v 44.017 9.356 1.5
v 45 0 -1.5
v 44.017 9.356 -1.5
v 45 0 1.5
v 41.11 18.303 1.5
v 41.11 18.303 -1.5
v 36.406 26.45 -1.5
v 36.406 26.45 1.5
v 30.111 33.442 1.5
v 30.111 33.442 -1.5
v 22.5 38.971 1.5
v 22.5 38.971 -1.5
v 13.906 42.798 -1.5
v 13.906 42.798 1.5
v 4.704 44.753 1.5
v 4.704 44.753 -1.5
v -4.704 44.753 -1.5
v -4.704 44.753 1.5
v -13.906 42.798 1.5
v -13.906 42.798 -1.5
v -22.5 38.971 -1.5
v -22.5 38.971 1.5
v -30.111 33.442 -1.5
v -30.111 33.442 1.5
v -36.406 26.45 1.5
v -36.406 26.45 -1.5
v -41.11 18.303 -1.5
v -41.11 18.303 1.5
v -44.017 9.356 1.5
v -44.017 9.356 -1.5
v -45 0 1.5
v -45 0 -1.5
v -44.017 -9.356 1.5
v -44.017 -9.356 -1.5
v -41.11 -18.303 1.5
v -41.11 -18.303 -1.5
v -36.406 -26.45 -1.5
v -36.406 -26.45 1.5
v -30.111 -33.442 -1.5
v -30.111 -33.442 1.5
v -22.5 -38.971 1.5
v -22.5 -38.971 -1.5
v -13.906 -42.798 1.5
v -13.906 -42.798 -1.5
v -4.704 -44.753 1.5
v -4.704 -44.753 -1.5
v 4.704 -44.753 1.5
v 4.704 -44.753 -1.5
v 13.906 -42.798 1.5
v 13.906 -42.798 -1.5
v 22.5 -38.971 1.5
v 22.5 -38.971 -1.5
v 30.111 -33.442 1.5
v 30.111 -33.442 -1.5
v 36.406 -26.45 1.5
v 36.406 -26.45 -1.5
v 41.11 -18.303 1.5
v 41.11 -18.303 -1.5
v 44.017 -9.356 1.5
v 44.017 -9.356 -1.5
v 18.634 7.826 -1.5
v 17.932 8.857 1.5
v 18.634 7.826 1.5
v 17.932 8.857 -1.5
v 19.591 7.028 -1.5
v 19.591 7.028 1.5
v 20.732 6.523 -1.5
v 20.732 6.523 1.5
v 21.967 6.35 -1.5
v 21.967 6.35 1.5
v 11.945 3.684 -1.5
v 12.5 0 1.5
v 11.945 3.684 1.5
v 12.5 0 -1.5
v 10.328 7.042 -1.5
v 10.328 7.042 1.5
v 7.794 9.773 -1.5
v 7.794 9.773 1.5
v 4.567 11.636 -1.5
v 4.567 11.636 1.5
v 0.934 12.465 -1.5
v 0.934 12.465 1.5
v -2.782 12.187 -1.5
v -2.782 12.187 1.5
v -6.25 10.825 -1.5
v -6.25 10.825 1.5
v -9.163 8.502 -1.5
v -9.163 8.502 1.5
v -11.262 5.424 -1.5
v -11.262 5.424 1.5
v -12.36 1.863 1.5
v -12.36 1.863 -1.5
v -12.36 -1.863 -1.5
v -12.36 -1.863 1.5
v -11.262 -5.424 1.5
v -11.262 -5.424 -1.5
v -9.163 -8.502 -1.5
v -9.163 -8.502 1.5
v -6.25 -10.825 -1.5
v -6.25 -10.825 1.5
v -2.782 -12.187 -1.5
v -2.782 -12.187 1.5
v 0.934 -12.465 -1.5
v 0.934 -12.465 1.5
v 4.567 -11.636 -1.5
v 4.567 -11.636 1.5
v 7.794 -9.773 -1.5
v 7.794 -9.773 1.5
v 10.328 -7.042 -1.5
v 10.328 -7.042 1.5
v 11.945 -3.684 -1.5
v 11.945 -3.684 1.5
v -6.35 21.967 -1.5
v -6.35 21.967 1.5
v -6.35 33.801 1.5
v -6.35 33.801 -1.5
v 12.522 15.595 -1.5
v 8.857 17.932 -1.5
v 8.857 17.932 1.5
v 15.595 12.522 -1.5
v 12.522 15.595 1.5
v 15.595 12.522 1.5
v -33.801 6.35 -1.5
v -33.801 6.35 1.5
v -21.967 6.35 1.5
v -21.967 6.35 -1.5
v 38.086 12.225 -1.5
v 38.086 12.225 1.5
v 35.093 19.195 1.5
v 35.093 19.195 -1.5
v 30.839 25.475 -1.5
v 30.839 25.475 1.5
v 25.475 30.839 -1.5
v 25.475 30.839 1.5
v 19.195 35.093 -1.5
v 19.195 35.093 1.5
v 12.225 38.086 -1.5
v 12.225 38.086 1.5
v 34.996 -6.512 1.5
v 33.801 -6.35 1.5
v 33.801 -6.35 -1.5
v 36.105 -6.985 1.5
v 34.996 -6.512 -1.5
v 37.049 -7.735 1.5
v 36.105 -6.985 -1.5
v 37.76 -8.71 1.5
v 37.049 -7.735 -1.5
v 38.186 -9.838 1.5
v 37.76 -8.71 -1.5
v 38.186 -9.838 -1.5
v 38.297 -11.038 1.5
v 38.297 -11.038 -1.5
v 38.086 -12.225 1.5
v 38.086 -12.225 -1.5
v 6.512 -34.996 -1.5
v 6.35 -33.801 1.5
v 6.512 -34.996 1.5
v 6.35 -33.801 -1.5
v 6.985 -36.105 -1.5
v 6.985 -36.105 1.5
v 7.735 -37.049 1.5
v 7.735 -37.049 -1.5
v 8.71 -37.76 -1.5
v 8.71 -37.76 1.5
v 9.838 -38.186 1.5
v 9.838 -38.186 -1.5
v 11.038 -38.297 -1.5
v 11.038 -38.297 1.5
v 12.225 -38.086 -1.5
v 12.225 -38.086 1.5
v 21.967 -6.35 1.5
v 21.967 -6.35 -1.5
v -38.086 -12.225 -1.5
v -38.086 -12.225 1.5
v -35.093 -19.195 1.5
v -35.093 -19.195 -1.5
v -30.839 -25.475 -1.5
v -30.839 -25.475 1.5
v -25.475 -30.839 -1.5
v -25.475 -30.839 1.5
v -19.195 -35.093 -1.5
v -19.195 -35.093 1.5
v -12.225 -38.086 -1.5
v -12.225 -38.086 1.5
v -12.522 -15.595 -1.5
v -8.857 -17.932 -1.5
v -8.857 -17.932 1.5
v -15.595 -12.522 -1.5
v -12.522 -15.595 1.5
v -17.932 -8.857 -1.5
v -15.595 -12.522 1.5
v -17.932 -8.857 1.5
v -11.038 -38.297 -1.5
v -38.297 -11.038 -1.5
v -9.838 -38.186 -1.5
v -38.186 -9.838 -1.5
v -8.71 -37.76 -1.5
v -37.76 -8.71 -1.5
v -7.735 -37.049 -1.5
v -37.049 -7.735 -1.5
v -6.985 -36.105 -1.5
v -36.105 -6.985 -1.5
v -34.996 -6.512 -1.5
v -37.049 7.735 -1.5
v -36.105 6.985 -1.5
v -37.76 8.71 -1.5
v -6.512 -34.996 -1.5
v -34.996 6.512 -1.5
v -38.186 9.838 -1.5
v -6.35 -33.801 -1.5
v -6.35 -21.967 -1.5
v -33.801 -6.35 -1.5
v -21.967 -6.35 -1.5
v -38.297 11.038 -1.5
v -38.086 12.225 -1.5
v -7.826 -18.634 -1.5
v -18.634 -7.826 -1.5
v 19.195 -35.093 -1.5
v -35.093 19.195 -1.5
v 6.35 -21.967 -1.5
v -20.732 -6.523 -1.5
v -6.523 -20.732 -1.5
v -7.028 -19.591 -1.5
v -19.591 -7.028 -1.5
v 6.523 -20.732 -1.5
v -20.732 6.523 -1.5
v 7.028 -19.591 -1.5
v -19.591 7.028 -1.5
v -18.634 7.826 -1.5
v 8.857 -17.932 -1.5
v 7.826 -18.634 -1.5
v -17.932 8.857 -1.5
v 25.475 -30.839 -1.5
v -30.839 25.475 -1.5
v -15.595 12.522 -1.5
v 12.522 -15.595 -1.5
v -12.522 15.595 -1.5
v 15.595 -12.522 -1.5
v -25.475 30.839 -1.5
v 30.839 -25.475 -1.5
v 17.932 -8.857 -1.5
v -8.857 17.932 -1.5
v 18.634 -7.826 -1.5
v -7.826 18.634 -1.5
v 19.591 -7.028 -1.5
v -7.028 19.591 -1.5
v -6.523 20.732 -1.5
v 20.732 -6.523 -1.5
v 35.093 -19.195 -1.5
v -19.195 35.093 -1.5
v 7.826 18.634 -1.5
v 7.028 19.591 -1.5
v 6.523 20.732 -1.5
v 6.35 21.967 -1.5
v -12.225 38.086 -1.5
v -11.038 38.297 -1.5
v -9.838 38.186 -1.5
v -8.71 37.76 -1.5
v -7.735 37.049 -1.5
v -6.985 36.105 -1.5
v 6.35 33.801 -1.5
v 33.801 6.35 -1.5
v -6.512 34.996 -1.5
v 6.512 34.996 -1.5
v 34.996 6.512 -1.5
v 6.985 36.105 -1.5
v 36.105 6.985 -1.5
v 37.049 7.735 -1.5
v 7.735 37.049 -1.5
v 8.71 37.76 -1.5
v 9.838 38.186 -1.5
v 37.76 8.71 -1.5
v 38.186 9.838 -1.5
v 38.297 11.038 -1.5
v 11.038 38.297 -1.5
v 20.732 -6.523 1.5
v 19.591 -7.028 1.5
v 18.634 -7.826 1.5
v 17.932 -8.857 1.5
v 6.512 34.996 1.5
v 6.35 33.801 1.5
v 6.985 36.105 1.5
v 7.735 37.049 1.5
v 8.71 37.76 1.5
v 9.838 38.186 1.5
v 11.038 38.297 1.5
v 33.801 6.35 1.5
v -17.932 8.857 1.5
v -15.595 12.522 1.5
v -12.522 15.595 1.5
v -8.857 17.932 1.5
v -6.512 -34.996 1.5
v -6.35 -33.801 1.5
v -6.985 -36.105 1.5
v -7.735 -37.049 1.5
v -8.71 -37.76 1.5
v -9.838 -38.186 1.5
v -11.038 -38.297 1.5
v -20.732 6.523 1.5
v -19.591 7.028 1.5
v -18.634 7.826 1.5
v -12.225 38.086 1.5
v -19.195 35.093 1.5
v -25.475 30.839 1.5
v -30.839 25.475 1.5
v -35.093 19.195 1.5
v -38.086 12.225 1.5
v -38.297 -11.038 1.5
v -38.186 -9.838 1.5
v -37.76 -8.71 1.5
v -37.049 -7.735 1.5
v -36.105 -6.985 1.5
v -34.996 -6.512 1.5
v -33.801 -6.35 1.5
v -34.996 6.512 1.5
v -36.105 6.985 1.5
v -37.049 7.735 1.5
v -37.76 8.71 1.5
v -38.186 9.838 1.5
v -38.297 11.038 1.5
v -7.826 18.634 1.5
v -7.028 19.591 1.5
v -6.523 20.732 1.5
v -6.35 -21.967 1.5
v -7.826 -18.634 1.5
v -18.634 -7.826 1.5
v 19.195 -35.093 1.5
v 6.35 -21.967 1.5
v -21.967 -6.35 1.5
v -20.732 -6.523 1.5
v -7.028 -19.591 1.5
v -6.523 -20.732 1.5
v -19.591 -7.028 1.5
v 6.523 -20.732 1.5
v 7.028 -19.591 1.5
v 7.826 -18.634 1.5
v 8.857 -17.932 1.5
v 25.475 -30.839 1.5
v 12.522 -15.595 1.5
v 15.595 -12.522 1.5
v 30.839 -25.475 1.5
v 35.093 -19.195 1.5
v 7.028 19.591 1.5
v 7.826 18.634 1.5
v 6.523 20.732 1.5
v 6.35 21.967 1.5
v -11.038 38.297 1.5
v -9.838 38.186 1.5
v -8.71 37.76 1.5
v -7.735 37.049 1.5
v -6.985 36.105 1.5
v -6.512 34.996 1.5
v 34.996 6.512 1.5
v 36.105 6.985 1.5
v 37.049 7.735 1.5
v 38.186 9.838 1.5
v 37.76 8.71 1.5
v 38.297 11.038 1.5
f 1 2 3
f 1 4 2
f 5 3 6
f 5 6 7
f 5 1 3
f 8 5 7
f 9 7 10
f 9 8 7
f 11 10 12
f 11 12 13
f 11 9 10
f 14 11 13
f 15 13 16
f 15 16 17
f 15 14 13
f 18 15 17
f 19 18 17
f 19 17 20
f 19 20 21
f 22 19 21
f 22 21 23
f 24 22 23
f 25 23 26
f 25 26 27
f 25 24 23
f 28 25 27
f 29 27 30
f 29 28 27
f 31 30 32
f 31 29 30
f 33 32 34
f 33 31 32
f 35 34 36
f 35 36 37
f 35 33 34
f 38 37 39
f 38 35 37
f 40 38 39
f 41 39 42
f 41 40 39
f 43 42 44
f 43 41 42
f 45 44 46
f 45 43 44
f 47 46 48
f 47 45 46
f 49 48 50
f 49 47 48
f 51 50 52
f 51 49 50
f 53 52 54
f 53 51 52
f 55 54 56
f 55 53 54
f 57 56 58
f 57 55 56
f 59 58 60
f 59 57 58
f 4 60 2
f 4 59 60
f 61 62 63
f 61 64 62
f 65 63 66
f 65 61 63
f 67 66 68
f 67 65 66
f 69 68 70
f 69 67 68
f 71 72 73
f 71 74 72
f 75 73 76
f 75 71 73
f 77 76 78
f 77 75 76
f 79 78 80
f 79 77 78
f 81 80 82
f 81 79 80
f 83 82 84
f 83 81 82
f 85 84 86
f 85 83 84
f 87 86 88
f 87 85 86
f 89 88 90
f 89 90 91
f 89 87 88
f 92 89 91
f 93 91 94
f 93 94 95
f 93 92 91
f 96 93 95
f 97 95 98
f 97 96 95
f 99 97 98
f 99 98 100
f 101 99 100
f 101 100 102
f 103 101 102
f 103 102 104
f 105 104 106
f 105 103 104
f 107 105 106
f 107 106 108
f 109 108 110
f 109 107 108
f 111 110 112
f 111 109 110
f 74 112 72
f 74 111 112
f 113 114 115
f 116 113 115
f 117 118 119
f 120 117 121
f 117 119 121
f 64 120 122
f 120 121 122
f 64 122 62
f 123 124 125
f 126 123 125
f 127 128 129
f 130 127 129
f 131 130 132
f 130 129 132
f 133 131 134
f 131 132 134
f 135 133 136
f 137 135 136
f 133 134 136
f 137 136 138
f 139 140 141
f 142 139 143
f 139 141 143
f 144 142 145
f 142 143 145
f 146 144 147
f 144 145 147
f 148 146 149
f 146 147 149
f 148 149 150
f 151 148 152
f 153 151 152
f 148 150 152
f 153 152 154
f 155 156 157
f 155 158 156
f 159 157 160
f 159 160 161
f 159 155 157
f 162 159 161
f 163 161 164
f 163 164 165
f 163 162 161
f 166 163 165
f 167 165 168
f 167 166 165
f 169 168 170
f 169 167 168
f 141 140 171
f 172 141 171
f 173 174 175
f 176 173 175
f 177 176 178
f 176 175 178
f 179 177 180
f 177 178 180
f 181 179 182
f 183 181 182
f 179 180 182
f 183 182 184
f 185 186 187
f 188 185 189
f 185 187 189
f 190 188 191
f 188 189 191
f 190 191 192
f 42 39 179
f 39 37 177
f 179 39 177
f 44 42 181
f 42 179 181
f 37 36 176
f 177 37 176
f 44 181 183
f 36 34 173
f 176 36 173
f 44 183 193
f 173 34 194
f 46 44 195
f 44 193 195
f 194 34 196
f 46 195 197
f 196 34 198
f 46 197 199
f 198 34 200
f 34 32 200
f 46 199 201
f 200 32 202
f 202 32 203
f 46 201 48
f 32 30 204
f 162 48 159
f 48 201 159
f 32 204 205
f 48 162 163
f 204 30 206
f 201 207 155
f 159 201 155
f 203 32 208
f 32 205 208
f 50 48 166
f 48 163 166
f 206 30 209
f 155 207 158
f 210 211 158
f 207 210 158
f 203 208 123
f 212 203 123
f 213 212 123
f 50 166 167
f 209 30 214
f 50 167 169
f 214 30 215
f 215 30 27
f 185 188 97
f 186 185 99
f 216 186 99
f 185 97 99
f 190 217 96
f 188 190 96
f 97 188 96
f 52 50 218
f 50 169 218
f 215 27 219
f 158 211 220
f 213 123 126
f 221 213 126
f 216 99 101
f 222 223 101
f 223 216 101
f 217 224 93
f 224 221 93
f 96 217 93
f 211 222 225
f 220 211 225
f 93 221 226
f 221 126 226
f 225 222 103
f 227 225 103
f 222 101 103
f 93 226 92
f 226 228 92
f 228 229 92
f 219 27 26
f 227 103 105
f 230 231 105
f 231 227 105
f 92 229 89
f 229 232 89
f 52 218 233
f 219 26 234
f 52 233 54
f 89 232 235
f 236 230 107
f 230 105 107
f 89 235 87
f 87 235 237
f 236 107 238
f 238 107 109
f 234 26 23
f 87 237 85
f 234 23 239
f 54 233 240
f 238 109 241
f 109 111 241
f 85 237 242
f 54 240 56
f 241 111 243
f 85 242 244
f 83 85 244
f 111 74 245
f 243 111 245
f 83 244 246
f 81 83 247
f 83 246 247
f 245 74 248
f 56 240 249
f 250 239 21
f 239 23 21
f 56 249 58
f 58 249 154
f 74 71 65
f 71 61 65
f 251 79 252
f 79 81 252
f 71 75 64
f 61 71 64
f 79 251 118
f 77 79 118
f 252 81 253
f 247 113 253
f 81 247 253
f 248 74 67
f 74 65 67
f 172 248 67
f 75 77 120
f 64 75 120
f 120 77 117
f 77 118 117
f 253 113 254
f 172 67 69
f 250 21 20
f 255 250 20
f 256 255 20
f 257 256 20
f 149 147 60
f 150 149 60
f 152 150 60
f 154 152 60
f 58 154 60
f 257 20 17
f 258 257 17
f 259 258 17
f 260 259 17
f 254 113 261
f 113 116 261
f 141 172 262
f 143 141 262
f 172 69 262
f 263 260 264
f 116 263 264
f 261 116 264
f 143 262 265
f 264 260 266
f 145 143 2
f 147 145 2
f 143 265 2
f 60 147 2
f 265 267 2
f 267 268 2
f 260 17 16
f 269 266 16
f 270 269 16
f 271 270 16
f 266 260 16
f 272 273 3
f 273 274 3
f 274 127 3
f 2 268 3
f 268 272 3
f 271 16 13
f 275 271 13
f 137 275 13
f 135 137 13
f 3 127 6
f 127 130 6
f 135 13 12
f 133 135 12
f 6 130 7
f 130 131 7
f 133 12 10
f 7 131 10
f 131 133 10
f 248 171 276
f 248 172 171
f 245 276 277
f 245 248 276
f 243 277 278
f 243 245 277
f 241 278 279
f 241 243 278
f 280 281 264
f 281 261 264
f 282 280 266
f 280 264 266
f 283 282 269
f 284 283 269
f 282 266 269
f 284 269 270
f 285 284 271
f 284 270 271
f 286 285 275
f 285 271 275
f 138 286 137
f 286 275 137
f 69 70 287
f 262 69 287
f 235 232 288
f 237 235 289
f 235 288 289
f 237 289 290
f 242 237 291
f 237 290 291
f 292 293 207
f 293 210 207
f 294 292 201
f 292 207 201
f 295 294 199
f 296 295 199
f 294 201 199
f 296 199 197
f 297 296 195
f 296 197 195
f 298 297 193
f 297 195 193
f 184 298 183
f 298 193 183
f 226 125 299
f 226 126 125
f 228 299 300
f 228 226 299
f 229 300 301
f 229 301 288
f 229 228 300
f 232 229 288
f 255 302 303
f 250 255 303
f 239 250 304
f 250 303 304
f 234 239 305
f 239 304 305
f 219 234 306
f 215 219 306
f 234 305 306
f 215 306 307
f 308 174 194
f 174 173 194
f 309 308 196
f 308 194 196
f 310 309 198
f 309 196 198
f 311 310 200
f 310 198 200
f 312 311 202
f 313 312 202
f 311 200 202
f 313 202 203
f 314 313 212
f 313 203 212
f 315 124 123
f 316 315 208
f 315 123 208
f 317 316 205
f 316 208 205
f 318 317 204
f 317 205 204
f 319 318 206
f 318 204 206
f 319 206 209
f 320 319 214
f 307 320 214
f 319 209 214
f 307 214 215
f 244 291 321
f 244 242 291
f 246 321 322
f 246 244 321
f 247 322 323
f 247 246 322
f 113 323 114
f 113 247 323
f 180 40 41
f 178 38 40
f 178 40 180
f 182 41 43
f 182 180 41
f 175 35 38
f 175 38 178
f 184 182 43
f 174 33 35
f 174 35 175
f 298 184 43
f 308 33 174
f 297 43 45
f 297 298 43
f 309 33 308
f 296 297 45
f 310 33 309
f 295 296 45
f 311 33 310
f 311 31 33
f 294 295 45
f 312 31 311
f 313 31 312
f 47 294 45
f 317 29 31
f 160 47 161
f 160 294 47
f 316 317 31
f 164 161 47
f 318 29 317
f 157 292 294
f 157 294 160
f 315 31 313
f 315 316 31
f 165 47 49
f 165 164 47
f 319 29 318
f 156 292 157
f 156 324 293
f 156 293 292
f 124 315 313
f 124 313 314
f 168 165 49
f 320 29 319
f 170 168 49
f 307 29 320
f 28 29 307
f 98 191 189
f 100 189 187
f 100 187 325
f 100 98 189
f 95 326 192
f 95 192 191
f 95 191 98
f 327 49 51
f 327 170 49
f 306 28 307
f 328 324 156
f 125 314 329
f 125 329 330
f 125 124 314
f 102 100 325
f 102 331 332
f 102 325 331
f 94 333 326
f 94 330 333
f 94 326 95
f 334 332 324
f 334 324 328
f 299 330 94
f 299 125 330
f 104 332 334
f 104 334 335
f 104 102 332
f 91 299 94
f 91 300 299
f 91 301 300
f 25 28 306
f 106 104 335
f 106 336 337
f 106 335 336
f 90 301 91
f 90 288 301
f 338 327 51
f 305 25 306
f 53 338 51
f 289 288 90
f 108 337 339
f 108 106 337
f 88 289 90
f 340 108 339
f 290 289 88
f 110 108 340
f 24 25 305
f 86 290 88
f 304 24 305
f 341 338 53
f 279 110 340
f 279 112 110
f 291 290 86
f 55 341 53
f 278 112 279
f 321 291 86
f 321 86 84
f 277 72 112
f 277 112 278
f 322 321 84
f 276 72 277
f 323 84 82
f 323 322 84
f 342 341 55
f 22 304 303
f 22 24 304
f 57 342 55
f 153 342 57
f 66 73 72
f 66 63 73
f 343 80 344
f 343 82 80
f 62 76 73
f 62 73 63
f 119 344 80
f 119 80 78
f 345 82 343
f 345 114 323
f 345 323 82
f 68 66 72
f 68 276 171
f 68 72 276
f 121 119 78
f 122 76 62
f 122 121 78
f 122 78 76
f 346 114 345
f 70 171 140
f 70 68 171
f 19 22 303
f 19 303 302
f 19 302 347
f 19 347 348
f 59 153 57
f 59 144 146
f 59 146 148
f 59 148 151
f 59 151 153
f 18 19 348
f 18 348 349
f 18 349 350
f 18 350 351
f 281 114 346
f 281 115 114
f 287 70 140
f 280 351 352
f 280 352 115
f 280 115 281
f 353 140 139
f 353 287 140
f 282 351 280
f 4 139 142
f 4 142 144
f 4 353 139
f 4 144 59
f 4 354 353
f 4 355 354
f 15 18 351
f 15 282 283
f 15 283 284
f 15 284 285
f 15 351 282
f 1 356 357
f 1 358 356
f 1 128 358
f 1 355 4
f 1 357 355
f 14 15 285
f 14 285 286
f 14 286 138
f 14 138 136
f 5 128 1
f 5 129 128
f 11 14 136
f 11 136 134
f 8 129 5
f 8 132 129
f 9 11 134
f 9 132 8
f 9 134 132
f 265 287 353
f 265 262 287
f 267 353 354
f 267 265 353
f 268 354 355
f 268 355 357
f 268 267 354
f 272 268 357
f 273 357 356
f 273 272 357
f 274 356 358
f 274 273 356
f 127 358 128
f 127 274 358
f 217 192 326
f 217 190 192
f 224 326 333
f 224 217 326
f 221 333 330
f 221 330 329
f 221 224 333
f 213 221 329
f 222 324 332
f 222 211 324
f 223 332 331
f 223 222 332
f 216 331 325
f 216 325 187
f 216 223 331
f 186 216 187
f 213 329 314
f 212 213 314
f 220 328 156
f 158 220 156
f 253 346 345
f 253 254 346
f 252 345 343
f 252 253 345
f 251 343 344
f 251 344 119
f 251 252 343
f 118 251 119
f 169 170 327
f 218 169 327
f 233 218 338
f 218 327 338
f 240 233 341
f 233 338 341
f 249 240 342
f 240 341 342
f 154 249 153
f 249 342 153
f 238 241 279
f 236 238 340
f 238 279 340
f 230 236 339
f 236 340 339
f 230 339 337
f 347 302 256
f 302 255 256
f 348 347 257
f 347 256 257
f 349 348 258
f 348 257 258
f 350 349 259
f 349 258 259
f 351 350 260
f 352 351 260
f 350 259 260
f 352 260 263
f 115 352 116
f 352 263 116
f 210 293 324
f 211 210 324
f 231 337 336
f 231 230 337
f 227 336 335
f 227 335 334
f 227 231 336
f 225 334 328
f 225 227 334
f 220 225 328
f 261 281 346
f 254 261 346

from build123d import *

# Parameters (mm, degrees)
SKETCH_1_R                       = 45
SKETCH_1_R_2                     = 12.5
EXTRUDE_1_DEPTH                  = 1.5
CUT_EXTRUDE_1_DEPTH              = 64.710281745
FILLET_1_R                       = 4.5
PATTERN_CIRCULAR_1_COUNT         = 4
FILLET_1_OF_PATTERN_CIRCULAR_1_R = 4.5


with BuildPart() as part:
    # 스케치1 → 보스-돌출1 (new, symmetric)
    with BuildSketch(Plane.XY):
        Circle(SKETCH_1_R)
        Circle(SKETCH_1_R_2, mode=Mode.SUBTRACT)
    extrude(amount=EXTRUDE_1_DEPTH, both=True)

    # 스케치2 → 컷-돌출1 (cut, through all)
    with BuildSketch(Plane.XY.offset(1.5)):
        with BuildLine():
            Line((6.35, 39.4927525), (6.35, 18.965165436))
            ThreePointArc((6.35, 18.965165436), (14.142135624, 14.142135624), (18.965165436, 6.35))
            Line((18.965165436, 6.35), (39.4927525, 6.35))
            ThreePointArc((39.4927525, 6.35), (28.284271247, 28.284271247), (6.35, 39.4927525))
        make_face()
    cut_extrude_1 = extrude(amount=-CUT_EXTRUDE_1_DEPTH, mode=Mode.SUBTRACT)

    # 필렛1
    fillet_1_edges = [part.edges().sort_by_distance(p)[0] for p in [
        (6.35, 39.4927525, 0),
        (39.4927525, 6.35, 0),
        (18.965165436, 6.35, 0),
        (6.35, 18.965165436, 0),
    ]]
    fillet(fillet_1_edges, radius=FILLET_1_R)

    # 원형 패턴1: 컷-돌출1 ×4 about axis
    pattern_circular_1_axis = Axis((0, 0, 0), (0, 0, 1))
    for i in range(1, PATTERN_CIRCULAR_1_COUNT):
        add(cut_extrude_1.rotate(pattern_circular_1_axis, i * 360 / PATTERN_CIRCULAR_1_COUNT), mode=Mode.SUBTRACT)

    # 필렛1 of 원형 패턴1
    fillet_1_of_pattern_circular_1_edges = [part.edges().sort_by_distance(p)[0] for p in [
        (-39.4927525, 6.35, 0),
        (-6.35, 39.4927525, 0),
        (-6.35, 18.965165436, 0),
        (-18.965165436, 6.35, 0),
        (-6.35, -39.4927525, 0),
        (-39.4927525, -6.35, 0),
        (-18.965165436, -6.35, 0),
        (-6.35, -18.965165436, 0),
        (39.4927525, -6.35, 0),
        (6.35, -39.4927525, 0),
        (6.35, -18.965165436, 0),
        (18.965165436, -6.35, 0),
    ]]
    fillet(fillet_1_of_pattern_circular_1_edges, radius=FILLET_1_OF_PATTERN_CIRCULAR_1_R)


solid = part.part
